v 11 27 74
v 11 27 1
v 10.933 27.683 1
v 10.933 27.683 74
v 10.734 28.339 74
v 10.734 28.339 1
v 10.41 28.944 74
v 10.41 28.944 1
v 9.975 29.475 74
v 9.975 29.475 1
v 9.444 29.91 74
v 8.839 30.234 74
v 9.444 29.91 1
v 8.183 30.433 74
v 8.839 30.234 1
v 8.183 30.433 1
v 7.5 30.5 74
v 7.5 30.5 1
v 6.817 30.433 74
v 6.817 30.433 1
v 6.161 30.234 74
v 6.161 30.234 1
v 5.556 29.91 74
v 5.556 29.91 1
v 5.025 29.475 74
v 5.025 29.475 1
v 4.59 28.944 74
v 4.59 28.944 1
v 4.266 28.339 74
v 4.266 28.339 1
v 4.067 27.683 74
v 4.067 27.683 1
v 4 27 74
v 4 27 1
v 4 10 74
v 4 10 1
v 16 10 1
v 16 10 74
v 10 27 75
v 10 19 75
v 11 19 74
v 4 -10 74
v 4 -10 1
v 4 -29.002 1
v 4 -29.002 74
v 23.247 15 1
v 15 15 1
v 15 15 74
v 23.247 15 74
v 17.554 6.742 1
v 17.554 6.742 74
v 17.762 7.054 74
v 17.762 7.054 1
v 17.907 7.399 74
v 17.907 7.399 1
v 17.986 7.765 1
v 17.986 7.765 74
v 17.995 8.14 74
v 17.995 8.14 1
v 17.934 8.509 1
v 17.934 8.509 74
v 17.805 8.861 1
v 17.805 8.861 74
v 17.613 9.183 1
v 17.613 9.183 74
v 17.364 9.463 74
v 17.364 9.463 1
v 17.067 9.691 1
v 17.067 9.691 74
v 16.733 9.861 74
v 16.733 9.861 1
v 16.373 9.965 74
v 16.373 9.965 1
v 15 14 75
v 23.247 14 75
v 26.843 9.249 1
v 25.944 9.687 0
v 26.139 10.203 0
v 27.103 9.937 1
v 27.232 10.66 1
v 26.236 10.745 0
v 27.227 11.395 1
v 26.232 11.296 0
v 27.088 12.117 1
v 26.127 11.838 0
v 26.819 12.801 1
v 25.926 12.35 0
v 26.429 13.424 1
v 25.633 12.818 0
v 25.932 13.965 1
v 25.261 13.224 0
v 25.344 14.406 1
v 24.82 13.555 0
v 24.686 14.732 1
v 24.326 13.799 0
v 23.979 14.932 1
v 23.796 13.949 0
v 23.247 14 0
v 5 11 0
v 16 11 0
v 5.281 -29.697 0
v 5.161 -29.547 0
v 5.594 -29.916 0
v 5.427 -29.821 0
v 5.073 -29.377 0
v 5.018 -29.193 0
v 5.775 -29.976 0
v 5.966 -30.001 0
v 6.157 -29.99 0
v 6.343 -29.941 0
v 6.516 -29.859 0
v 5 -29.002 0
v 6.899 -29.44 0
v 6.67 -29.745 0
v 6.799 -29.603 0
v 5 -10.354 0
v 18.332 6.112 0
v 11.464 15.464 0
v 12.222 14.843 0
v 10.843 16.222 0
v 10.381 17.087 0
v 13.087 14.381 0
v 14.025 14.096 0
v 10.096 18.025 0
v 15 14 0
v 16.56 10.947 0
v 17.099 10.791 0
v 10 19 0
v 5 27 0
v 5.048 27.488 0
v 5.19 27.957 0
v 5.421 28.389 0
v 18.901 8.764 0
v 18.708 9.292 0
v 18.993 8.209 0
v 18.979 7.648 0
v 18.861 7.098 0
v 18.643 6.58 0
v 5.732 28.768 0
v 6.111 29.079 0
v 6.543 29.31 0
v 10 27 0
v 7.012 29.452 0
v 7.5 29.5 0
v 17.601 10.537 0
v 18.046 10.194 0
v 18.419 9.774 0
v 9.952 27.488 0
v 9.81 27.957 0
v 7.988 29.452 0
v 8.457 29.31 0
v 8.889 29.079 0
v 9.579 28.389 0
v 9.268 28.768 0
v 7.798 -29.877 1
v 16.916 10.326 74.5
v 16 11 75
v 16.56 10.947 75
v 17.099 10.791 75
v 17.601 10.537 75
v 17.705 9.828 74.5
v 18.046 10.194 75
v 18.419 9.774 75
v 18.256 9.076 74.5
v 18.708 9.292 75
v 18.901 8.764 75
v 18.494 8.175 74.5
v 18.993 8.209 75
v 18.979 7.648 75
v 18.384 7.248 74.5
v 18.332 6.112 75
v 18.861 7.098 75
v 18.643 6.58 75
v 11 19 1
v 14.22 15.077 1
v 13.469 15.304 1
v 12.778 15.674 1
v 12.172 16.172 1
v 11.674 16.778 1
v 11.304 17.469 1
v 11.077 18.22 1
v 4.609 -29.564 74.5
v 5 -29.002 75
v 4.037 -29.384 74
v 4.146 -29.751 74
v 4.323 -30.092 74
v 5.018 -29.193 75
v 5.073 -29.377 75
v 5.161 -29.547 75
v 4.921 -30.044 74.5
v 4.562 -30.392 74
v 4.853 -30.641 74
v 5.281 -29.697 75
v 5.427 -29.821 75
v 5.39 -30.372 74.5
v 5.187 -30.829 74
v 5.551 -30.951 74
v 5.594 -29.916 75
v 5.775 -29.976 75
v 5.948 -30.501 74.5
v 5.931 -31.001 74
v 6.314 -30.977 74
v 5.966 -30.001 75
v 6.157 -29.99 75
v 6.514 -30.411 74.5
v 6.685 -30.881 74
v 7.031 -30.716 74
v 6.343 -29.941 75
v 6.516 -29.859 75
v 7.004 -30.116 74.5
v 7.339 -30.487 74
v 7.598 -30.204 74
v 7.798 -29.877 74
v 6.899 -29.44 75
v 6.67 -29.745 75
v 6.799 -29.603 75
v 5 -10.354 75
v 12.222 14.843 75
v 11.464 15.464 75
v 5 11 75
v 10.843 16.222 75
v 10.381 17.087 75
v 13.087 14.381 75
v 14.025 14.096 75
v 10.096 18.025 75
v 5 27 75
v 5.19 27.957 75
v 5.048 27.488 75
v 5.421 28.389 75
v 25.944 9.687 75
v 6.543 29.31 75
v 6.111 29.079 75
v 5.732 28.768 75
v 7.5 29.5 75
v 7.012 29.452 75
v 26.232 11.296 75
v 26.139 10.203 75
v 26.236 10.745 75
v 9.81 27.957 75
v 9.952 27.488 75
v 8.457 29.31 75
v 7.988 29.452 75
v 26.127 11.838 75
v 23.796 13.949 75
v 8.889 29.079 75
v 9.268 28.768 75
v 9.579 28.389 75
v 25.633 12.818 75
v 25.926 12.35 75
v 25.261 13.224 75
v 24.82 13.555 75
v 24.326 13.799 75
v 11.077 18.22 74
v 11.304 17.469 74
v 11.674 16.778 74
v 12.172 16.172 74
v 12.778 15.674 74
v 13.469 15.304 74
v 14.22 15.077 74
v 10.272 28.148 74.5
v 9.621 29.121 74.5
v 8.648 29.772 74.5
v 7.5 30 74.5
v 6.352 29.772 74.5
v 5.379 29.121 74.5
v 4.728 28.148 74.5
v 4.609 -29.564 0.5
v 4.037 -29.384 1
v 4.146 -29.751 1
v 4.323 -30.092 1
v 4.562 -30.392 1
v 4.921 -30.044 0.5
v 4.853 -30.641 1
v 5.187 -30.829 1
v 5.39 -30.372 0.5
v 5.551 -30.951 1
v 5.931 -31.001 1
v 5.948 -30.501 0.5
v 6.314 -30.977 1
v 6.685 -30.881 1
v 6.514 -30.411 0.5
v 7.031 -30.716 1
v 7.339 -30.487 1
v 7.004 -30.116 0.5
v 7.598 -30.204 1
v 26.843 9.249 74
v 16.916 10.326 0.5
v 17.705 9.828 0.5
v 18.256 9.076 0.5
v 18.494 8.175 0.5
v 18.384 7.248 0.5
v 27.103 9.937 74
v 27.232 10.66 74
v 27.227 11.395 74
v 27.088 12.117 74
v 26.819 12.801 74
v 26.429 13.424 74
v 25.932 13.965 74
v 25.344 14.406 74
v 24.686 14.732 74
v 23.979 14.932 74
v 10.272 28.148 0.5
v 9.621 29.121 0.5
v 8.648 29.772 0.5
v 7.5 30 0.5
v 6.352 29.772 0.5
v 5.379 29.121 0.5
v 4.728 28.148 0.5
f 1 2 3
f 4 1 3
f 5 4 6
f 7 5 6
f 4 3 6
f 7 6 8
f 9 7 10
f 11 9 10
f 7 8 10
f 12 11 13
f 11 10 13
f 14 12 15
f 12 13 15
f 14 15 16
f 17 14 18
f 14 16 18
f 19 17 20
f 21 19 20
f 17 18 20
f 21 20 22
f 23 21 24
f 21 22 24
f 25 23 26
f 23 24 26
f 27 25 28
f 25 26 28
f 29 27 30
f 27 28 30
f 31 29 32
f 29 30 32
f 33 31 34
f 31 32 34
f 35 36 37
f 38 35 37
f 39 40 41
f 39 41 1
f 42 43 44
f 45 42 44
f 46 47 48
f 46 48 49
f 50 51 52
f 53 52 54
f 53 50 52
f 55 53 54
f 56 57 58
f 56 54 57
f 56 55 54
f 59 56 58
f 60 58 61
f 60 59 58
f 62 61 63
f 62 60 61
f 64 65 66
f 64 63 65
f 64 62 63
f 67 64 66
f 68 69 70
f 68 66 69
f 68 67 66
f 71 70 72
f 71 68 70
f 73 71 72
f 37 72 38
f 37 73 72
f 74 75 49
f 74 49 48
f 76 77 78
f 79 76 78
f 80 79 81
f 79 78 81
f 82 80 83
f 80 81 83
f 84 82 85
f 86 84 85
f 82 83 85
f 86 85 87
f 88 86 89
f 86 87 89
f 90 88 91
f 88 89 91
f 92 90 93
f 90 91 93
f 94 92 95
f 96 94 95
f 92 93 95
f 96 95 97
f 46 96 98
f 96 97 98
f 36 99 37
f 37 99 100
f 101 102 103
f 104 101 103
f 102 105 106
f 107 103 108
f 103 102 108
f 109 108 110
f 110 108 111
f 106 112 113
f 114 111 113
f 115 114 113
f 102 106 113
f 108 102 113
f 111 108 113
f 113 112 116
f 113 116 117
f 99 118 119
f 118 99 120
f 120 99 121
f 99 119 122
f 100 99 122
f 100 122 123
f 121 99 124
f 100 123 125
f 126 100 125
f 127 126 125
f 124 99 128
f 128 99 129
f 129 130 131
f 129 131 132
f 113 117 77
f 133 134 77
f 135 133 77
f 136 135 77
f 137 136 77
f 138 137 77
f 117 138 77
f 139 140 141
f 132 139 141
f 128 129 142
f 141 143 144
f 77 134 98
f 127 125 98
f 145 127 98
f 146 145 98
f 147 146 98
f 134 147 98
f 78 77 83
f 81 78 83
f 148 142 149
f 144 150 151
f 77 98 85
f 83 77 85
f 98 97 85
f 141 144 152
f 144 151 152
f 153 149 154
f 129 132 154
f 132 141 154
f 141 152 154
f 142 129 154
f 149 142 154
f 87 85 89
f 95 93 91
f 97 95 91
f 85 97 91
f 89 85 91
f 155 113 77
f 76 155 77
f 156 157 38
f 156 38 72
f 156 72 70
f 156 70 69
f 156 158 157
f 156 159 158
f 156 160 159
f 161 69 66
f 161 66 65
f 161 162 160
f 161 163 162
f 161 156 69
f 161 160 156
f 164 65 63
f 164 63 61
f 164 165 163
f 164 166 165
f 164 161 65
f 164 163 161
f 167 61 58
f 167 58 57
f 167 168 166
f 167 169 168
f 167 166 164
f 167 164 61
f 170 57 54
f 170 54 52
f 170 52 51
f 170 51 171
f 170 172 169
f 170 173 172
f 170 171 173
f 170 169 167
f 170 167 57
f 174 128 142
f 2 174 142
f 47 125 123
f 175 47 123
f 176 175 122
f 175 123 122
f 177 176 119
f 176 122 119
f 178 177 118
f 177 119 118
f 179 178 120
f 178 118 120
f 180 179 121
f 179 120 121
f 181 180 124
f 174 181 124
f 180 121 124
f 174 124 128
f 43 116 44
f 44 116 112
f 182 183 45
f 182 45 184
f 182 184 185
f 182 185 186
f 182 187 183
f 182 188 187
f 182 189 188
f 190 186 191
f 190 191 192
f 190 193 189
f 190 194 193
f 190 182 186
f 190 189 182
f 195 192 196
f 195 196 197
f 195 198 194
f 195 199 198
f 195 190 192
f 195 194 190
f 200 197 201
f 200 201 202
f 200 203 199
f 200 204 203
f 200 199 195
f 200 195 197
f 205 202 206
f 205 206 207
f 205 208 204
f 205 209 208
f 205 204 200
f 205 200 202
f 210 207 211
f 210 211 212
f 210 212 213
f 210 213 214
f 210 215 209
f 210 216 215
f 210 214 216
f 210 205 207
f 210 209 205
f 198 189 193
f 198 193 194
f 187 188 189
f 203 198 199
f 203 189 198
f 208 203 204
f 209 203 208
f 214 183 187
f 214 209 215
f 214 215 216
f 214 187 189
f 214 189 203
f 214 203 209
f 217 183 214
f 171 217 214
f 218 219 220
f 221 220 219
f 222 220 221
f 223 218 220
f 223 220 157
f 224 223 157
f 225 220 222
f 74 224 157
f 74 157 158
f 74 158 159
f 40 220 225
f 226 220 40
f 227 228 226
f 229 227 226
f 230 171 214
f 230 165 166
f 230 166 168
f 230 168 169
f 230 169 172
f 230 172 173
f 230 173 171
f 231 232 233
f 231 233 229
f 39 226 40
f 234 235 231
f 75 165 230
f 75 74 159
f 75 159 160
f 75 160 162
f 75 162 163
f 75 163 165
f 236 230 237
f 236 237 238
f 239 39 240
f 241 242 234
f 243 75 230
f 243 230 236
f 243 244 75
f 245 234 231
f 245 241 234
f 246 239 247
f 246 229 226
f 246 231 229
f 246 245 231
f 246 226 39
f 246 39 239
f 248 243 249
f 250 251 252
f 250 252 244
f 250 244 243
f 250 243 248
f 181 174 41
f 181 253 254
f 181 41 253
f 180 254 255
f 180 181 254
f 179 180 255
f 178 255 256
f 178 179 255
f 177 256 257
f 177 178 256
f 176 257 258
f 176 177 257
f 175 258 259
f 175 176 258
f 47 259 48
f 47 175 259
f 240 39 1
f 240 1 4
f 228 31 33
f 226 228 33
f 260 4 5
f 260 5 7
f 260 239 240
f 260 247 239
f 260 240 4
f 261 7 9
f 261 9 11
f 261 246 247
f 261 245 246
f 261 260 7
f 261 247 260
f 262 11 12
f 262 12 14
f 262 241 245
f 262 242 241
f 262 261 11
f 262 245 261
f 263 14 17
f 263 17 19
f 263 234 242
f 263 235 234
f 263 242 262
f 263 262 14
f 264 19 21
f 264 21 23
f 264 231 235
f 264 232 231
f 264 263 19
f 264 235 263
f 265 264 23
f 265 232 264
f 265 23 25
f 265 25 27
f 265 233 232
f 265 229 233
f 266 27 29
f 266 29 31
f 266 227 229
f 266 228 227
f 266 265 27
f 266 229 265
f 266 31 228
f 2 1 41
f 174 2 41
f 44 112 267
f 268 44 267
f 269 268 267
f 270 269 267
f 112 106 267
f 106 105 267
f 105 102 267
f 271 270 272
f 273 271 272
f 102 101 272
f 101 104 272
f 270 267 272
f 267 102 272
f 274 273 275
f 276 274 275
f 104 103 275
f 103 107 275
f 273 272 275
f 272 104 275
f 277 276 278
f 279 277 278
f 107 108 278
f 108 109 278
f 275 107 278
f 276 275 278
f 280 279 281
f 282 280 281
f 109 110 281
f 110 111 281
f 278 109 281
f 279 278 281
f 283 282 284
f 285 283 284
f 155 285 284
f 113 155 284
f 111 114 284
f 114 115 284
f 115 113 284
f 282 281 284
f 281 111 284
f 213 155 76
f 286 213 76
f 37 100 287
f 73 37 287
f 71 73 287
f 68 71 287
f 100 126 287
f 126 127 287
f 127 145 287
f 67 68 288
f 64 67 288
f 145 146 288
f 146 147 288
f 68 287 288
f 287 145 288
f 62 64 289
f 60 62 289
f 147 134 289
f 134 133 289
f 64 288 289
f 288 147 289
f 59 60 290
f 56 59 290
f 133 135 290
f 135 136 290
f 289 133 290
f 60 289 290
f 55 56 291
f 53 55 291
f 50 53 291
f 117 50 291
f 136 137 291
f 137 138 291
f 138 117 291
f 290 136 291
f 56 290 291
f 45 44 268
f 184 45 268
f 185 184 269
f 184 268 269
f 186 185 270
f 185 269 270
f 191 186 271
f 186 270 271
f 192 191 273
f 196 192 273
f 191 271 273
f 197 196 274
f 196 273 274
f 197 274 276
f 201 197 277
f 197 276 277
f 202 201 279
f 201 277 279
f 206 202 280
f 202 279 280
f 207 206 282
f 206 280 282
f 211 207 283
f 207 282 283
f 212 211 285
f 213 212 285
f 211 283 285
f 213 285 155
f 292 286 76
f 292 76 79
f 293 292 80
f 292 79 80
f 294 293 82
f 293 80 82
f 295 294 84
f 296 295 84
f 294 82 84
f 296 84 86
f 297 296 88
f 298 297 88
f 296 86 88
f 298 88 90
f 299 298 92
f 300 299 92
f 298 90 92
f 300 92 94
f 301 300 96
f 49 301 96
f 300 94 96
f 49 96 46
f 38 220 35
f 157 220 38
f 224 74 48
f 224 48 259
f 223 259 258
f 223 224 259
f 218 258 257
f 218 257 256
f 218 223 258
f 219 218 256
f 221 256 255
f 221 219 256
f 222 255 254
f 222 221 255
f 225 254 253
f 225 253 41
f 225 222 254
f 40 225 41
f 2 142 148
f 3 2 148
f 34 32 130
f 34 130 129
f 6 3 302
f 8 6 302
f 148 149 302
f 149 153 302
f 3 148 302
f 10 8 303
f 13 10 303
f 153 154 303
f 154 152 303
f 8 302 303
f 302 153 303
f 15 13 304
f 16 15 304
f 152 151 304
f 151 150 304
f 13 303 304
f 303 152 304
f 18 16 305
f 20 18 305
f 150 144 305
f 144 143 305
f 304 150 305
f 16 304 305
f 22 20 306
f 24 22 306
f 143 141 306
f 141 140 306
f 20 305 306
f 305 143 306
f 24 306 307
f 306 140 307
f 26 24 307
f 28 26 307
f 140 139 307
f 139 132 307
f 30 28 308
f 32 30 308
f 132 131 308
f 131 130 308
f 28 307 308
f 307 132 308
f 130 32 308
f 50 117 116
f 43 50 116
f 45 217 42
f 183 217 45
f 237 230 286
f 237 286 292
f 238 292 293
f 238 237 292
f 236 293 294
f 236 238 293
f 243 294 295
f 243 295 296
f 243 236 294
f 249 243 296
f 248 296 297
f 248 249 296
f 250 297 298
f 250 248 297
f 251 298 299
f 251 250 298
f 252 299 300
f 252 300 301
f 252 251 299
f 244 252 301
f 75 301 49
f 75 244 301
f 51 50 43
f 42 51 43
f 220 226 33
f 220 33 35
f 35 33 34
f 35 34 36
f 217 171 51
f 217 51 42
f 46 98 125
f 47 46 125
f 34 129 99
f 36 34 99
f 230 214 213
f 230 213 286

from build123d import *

# Parameters (mm, degrees)
PAD_DEPTH    = 75
CHAMFER_SIZE = 1


with BuildPart() as part:
    # Sketch → Pad (new body)
    with BuildSketch(Plane.XY):
        with BuildLine():
            Line((4, 27), (4, 10))
            Line((4, 10), (16, 10))
            ThreePointArc((17.55441, 6.741505), (17.80513, 8.861107), (16, 10))
            Line((17.55441, 6.741505), (4, -10))
            Line((4, -10), (4, -29.001949))
            ThreePointArc((4, -29.001949), (5.550868, -30.950867), (7.798281, -29.87727))
            Line((7.798281, -29.87727), (26.843334, 9.249358))
            ThreePointArc((26.843334, 9.249358), (26.638127, 13.121018), (23.246773, 15))
            Line((15, 15), (23.246773, 15))
            ThreePointArc((11, 19), (12.171573, 16.171573), (15, 15))
            Line((11, 27), (11, 19))
            ThreePointArc((11, 27), (7.5, 30.5), (4, 27))
        make_face()
    extrude(amount=PAD_DEPTH)

    # Chamfer
    chamfer_edges = [part.edges().sort_by_distance(p)[0] for p in [
        (7.5, 30.5, 75),
        (4, 18.5, 75),
        (10, 10, 75),
        (17.80513, 8.861107, 75),
        (10.777205, -1.629248, 75),
        (4, -19.500975, 75),
        (5.550868, -30.950867, 75),
        (17.320807, -10.313956, 75),
        (26.638127, 13.121018, 75),
        (19.123386, 15, 75),
        (12.171573, 16.171573, 75),
        (11, 23, 75),
        (7.5, 30.5, 0),
        (4, 18.5, 0),
        (10, 10, 0),
        (17.80513, 8.861107, 0),
        (10.777205, -1.629248, 0),
        (4, -19.500975, 0),
        (5.550868, -30.950867, 0),
        (17.320807, -10.313956, 0),
        (26.638127, 13.121018, 0),
        (19.123386, 15, 0),
        (12.171573, 16.171573, 0),
        (11, 23, 0),
    ]]
    chamfer(chamfer_edges, length=CHAMFER_SIZE)


solid = part.part
